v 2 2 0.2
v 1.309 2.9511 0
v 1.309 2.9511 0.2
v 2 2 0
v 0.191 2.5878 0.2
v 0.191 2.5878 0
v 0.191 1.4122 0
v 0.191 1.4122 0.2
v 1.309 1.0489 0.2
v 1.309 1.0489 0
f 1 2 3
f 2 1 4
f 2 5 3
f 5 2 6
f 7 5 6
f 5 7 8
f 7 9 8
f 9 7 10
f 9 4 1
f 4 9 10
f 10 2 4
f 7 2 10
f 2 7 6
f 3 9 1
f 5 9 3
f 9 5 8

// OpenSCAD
module port(position, radius, height, flip, z_offset){
	translate([position[0],position[1],z_offset]){
		if (flip)
		{
			rotate([180,0,0])
			{
				cylinder(height, r = radius);
			}
		}
		else
		{
			cylinder(height, r = radius);
		}
	}
}

port(position=[1,2],radius=1, height=.2,flip=false,z_offset=0);
